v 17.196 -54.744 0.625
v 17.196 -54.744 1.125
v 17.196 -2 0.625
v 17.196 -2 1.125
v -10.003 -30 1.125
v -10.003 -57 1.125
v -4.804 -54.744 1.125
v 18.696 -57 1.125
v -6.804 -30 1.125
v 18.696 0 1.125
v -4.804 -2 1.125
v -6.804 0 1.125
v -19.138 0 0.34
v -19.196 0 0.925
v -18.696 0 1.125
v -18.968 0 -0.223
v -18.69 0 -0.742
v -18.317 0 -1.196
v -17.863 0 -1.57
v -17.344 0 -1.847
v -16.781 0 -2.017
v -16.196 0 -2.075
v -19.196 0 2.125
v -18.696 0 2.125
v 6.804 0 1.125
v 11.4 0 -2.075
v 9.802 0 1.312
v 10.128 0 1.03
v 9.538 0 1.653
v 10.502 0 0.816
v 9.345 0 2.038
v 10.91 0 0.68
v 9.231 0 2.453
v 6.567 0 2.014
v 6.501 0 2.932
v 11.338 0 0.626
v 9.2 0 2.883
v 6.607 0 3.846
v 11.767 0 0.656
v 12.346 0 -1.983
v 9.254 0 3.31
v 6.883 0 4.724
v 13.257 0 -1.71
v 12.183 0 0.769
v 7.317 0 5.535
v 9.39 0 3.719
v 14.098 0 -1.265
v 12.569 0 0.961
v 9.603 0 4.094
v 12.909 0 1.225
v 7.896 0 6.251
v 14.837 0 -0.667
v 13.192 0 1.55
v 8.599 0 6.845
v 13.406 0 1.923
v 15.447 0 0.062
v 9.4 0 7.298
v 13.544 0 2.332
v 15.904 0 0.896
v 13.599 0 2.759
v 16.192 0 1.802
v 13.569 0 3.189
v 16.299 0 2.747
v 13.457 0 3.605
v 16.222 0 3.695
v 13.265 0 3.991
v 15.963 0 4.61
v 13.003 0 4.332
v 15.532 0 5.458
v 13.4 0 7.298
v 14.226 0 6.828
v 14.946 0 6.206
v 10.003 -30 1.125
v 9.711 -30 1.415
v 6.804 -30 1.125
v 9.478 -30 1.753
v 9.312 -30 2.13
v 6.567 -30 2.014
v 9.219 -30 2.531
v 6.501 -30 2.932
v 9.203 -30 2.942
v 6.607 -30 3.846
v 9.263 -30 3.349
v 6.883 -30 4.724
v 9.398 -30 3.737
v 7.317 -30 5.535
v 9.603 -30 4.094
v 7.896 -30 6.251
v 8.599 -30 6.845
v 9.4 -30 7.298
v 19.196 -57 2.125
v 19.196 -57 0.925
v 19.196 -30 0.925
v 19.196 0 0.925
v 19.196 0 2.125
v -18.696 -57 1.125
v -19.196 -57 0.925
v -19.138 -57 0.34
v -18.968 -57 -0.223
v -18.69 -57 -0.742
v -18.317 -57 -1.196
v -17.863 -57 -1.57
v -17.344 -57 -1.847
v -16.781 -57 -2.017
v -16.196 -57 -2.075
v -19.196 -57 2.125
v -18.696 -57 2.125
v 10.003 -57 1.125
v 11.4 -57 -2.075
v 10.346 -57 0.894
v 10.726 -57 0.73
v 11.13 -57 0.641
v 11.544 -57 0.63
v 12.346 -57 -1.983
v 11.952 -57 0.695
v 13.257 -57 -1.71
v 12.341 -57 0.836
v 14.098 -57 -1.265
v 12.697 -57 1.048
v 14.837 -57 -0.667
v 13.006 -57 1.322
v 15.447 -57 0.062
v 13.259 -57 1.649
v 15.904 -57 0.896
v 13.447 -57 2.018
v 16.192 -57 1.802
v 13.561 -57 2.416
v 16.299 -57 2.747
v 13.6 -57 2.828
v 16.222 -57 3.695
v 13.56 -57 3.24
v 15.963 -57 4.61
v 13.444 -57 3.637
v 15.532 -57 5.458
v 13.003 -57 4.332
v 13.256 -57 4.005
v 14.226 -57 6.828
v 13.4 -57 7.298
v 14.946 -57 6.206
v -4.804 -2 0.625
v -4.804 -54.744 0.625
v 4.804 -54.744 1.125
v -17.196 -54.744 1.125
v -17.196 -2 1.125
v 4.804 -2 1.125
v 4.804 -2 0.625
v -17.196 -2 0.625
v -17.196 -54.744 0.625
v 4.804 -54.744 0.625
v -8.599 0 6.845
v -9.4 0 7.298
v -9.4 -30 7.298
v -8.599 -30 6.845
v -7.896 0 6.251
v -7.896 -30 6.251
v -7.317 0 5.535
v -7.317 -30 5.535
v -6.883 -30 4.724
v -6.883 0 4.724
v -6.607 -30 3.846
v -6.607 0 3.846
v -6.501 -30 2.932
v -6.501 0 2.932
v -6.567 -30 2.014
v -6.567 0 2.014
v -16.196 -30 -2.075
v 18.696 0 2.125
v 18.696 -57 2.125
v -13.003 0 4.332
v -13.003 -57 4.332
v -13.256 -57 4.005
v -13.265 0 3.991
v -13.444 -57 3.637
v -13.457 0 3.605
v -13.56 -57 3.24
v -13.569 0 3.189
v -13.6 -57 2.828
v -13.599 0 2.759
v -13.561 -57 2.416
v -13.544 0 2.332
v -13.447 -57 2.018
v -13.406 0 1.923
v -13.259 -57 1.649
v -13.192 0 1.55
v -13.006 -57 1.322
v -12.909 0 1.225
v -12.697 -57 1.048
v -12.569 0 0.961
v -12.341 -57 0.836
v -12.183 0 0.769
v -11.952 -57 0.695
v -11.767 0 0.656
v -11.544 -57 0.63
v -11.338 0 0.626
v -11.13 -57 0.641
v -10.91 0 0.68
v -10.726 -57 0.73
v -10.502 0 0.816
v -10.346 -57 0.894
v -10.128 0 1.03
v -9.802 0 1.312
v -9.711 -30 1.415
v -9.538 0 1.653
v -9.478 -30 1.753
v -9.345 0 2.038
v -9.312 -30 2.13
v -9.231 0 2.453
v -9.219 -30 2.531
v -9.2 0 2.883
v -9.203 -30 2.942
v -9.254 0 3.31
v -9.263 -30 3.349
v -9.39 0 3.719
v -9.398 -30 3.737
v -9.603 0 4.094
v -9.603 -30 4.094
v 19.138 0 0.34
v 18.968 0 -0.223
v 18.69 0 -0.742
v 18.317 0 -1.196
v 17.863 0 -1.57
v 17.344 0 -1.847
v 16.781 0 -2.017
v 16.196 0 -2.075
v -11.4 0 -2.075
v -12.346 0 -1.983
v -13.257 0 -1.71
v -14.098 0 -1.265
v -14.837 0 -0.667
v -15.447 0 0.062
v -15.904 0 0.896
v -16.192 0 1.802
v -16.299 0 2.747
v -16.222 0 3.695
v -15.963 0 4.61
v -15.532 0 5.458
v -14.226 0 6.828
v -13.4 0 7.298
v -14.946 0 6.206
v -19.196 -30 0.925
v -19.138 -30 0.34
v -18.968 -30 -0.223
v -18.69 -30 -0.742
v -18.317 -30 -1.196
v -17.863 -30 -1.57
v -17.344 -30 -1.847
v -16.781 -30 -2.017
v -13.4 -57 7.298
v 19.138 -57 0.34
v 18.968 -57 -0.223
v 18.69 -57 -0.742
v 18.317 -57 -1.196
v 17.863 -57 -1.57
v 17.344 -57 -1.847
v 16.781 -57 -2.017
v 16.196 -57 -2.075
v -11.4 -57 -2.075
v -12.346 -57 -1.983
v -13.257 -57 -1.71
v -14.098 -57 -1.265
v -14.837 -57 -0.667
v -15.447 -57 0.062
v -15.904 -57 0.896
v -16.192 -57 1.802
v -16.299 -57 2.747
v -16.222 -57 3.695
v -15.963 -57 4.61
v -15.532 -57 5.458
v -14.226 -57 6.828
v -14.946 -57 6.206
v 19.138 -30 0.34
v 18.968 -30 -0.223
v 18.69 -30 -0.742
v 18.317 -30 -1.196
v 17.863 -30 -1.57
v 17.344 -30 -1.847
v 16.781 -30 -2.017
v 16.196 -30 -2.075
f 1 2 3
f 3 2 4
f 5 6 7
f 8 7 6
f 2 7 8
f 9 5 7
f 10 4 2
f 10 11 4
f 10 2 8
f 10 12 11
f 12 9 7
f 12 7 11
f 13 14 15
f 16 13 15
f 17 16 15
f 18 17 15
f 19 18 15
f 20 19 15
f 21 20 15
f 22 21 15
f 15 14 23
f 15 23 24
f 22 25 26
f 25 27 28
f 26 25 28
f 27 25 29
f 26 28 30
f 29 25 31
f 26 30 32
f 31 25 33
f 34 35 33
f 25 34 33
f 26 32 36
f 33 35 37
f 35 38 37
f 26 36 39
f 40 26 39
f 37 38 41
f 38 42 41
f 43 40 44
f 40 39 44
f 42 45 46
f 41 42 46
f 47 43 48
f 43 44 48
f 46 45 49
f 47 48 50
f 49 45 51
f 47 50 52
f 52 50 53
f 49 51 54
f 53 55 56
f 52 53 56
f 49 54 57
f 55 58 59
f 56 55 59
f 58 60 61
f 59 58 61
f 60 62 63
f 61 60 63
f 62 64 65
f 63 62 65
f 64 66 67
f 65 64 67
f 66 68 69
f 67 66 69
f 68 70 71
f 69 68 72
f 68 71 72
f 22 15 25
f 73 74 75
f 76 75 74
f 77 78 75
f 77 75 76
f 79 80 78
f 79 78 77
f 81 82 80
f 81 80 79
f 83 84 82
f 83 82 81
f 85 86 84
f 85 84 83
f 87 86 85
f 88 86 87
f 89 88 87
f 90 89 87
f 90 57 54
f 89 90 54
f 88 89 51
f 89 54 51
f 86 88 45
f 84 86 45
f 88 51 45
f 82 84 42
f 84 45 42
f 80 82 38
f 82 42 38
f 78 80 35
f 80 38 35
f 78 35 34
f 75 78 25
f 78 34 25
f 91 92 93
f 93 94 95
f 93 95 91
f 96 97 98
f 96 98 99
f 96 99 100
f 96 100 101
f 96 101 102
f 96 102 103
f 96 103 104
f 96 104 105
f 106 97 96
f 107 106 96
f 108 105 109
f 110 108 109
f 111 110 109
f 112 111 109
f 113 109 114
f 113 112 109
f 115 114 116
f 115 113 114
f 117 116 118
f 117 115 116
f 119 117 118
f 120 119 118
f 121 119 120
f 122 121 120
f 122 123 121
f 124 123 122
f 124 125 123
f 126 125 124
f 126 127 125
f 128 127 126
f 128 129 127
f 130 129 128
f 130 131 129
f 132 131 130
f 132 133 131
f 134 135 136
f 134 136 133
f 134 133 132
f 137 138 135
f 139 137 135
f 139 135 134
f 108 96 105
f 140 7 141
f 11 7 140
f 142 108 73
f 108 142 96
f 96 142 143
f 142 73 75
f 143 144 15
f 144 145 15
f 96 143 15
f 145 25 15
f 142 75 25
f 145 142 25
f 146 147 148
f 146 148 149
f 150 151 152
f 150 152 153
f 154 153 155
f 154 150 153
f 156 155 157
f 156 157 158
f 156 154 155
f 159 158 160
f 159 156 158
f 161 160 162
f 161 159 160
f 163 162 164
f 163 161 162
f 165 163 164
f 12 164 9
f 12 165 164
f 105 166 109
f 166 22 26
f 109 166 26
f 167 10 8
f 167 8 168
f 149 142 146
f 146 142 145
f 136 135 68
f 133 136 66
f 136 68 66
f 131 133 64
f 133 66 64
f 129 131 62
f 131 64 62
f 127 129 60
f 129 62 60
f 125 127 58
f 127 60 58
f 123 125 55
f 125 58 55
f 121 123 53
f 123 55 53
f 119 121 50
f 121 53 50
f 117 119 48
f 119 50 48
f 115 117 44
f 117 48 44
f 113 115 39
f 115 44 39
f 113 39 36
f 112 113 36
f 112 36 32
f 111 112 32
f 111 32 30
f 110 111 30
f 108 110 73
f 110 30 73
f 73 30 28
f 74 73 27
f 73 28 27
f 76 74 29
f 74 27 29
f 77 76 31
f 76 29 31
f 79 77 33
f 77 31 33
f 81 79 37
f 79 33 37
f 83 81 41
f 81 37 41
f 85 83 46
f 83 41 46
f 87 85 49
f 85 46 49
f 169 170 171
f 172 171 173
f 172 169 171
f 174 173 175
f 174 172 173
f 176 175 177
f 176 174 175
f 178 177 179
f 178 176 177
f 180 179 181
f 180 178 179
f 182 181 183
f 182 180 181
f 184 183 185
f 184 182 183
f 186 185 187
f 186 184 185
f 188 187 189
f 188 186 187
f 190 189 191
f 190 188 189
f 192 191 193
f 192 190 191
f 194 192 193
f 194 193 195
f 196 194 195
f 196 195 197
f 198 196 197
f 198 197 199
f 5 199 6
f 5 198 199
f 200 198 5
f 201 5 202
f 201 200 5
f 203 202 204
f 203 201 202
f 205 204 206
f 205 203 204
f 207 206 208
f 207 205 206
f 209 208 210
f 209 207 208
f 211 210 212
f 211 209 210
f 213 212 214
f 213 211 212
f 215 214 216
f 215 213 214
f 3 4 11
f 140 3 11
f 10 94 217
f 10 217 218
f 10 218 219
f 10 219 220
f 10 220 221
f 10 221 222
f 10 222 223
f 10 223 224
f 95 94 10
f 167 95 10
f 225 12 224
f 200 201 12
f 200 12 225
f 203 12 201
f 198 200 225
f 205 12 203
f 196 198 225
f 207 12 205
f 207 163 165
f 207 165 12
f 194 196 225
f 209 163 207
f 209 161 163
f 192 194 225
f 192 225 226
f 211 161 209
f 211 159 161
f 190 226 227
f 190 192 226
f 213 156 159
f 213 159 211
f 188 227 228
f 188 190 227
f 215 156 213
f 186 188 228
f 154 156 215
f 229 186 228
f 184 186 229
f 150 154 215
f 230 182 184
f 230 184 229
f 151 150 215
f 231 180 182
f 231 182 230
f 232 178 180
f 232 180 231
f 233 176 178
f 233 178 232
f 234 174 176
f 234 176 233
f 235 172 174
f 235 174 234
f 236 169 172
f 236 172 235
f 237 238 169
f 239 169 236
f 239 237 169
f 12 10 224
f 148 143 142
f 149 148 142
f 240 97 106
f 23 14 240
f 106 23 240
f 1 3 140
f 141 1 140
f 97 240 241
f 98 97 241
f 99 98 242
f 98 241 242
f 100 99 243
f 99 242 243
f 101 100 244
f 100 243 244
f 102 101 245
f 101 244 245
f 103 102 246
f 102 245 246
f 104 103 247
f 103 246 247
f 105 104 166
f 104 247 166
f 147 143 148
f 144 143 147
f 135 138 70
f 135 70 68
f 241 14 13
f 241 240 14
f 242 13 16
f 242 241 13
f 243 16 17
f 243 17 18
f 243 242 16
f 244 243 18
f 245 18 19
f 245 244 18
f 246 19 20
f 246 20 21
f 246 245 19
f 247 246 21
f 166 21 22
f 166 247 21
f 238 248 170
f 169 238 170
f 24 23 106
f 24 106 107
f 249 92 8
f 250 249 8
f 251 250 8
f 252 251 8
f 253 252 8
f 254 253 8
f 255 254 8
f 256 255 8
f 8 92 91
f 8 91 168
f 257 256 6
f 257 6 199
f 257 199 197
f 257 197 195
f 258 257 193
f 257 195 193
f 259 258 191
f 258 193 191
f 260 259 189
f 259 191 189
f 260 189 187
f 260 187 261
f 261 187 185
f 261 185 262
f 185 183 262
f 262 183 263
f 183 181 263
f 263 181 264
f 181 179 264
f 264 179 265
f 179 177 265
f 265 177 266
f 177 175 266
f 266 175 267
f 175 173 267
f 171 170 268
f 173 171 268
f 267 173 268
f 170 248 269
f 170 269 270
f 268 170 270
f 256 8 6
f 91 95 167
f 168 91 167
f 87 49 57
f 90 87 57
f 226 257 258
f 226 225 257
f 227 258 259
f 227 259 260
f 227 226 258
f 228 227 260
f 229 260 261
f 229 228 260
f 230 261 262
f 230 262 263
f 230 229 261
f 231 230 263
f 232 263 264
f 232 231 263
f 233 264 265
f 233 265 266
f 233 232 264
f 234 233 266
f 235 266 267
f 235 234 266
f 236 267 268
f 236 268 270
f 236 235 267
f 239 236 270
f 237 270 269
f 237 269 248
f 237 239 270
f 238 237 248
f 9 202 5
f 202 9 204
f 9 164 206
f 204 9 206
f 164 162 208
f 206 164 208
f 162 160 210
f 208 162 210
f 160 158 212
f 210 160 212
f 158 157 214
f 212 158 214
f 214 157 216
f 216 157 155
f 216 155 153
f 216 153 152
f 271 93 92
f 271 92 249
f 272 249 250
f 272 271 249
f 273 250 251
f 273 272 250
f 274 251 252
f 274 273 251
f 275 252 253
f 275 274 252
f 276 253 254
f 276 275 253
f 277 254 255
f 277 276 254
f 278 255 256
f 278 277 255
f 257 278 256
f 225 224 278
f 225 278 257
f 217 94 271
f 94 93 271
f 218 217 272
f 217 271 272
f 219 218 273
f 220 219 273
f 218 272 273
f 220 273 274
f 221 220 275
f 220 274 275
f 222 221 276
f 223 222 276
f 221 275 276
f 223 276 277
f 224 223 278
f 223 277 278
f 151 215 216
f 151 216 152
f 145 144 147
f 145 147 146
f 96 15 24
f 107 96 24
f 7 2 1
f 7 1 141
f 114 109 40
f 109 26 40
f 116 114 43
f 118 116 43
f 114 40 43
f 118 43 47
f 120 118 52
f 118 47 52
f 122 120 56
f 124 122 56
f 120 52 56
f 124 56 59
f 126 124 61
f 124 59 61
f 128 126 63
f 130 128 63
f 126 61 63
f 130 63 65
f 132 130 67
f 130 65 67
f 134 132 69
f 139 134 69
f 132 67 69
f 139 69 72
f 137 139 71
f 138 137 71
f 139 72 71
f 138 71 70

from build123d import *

# Parameters (mm, degrees)
F1_DEPTH = 30
F2_R     = 3
F4_DEPTH = 27
F5_W     = 22
F5_H     = 52.7442957759
F6_DEPTH = 0.5
F0_W     = 0.5
F0_H     = 1
F7_DEPTH = 57


# Not quite as in the source:
# - a feature names something its author has since deleted; it is built from what else it names


with BuildPart() as f1:
    # F0 (on Front) → F1 (new body)
    with BuildSketch(Plane.XZ):
        with BuildLine():
            Line((-18.695979941, 1.1248678452), (-19.195979941, 1.1248678452))
            Line((-19.195979941, 1.1248678452), (-19.195979941, -2.0751321548))
            Line((-19.195979941, -2.0751321548), (11.3996701762, -2.0751321548))
            ThreePointArc((11.3996701762, -2.0751321548), (16.1917962107, 1.8023571757), (13.3996701762, 7.2981216945))
            Line((13.3996701762, 7.2981216945), (13.0025328865, 4.3317955581))
            ThreePointArc((13.0025328865, 4.3317955581), (11.5532638802, 0.6302359913), (9.6025328865, 4.0938428497))
            Line((9.6025328865, 4.0938428497), (9.3996701762, 7.2981216945))
            ThreePointArc((9.3996701762, 7.2981216945), (6.8827114771, 4.724100351), (6.804020059, 1.1248678452))
            Line((6.804020059, 1.1248678452), (-18.695979941, 1.1248678452))
        make_face()
    extrude(amount=F1_DEPTH)

    # F2
    f2_edges = [f1.edges().sort_by_distance(p)[0] for p in [
        (-19.19598, -15, -2.075132),
    ]]
    fillet(f2_edges, radius=F2_R)

    # F3 (on face) → F4 (join)
    with BuildSketch(Plane.XZ.offset(30)):
        with BuildLine():
            Line((10.0032461718, 1.1248678452), (6.804020059, 1.1248678452))
            Line((6.804020059, 1.1248678452), (-19.195979941, 1.1248678452))
            Line((-19.195979941, 1.1248678452), (-19.195979941, 0.9248678452))
            ThreePointArc((-19.195979941, 0.9248678452), (-18.3173002846, -1.1964524984), (-16.195979941, -2.0751321548))
            Line((-16.195979941, -2.0751321548), (11.3996701762, -2.0751321548))
            ThreePointArc((11.3996701762, -2.0751321548), (16.1917962107, 1.8023571757), (13.3996701762, 7.2981216945))
            Line((13.3996701762, 7.2981216945), (13.0025328865, 4.3317955581))
            ThreePointArc((13.0025328865, 4.3317955581), (13.006452854, 1.3221205523), (10.0032461718, 1.1248678452))
        make_face()
    extrude(amount=F4_DEPTH)

    # F5 (on face) → F6 (cut)
    with BuildSketch(Plane.XY.offset(1.1248678452)):
        with Locations((-6.195979941, -28.3721478879)):
            Rectangle(F5_W, F5_H)
    extrude(amount=-F6_DEPTH, mode=Mode.SUBTRACT)

    # F0 (on Front) → F7 (join)
    with BuildSketch(Plane.XZ):
        with Locations((-18.945979941, 1.6248678452)):
            Rectangle(F0_W, F0_H)
    extrude(amount=F7_DEPTH)


with BuildPart() as f8_1:
    # F8: instance of F1
    add(f1.part.mirror(Plane.YZ))


solid = Compound([f1.part, f8_1.part])
